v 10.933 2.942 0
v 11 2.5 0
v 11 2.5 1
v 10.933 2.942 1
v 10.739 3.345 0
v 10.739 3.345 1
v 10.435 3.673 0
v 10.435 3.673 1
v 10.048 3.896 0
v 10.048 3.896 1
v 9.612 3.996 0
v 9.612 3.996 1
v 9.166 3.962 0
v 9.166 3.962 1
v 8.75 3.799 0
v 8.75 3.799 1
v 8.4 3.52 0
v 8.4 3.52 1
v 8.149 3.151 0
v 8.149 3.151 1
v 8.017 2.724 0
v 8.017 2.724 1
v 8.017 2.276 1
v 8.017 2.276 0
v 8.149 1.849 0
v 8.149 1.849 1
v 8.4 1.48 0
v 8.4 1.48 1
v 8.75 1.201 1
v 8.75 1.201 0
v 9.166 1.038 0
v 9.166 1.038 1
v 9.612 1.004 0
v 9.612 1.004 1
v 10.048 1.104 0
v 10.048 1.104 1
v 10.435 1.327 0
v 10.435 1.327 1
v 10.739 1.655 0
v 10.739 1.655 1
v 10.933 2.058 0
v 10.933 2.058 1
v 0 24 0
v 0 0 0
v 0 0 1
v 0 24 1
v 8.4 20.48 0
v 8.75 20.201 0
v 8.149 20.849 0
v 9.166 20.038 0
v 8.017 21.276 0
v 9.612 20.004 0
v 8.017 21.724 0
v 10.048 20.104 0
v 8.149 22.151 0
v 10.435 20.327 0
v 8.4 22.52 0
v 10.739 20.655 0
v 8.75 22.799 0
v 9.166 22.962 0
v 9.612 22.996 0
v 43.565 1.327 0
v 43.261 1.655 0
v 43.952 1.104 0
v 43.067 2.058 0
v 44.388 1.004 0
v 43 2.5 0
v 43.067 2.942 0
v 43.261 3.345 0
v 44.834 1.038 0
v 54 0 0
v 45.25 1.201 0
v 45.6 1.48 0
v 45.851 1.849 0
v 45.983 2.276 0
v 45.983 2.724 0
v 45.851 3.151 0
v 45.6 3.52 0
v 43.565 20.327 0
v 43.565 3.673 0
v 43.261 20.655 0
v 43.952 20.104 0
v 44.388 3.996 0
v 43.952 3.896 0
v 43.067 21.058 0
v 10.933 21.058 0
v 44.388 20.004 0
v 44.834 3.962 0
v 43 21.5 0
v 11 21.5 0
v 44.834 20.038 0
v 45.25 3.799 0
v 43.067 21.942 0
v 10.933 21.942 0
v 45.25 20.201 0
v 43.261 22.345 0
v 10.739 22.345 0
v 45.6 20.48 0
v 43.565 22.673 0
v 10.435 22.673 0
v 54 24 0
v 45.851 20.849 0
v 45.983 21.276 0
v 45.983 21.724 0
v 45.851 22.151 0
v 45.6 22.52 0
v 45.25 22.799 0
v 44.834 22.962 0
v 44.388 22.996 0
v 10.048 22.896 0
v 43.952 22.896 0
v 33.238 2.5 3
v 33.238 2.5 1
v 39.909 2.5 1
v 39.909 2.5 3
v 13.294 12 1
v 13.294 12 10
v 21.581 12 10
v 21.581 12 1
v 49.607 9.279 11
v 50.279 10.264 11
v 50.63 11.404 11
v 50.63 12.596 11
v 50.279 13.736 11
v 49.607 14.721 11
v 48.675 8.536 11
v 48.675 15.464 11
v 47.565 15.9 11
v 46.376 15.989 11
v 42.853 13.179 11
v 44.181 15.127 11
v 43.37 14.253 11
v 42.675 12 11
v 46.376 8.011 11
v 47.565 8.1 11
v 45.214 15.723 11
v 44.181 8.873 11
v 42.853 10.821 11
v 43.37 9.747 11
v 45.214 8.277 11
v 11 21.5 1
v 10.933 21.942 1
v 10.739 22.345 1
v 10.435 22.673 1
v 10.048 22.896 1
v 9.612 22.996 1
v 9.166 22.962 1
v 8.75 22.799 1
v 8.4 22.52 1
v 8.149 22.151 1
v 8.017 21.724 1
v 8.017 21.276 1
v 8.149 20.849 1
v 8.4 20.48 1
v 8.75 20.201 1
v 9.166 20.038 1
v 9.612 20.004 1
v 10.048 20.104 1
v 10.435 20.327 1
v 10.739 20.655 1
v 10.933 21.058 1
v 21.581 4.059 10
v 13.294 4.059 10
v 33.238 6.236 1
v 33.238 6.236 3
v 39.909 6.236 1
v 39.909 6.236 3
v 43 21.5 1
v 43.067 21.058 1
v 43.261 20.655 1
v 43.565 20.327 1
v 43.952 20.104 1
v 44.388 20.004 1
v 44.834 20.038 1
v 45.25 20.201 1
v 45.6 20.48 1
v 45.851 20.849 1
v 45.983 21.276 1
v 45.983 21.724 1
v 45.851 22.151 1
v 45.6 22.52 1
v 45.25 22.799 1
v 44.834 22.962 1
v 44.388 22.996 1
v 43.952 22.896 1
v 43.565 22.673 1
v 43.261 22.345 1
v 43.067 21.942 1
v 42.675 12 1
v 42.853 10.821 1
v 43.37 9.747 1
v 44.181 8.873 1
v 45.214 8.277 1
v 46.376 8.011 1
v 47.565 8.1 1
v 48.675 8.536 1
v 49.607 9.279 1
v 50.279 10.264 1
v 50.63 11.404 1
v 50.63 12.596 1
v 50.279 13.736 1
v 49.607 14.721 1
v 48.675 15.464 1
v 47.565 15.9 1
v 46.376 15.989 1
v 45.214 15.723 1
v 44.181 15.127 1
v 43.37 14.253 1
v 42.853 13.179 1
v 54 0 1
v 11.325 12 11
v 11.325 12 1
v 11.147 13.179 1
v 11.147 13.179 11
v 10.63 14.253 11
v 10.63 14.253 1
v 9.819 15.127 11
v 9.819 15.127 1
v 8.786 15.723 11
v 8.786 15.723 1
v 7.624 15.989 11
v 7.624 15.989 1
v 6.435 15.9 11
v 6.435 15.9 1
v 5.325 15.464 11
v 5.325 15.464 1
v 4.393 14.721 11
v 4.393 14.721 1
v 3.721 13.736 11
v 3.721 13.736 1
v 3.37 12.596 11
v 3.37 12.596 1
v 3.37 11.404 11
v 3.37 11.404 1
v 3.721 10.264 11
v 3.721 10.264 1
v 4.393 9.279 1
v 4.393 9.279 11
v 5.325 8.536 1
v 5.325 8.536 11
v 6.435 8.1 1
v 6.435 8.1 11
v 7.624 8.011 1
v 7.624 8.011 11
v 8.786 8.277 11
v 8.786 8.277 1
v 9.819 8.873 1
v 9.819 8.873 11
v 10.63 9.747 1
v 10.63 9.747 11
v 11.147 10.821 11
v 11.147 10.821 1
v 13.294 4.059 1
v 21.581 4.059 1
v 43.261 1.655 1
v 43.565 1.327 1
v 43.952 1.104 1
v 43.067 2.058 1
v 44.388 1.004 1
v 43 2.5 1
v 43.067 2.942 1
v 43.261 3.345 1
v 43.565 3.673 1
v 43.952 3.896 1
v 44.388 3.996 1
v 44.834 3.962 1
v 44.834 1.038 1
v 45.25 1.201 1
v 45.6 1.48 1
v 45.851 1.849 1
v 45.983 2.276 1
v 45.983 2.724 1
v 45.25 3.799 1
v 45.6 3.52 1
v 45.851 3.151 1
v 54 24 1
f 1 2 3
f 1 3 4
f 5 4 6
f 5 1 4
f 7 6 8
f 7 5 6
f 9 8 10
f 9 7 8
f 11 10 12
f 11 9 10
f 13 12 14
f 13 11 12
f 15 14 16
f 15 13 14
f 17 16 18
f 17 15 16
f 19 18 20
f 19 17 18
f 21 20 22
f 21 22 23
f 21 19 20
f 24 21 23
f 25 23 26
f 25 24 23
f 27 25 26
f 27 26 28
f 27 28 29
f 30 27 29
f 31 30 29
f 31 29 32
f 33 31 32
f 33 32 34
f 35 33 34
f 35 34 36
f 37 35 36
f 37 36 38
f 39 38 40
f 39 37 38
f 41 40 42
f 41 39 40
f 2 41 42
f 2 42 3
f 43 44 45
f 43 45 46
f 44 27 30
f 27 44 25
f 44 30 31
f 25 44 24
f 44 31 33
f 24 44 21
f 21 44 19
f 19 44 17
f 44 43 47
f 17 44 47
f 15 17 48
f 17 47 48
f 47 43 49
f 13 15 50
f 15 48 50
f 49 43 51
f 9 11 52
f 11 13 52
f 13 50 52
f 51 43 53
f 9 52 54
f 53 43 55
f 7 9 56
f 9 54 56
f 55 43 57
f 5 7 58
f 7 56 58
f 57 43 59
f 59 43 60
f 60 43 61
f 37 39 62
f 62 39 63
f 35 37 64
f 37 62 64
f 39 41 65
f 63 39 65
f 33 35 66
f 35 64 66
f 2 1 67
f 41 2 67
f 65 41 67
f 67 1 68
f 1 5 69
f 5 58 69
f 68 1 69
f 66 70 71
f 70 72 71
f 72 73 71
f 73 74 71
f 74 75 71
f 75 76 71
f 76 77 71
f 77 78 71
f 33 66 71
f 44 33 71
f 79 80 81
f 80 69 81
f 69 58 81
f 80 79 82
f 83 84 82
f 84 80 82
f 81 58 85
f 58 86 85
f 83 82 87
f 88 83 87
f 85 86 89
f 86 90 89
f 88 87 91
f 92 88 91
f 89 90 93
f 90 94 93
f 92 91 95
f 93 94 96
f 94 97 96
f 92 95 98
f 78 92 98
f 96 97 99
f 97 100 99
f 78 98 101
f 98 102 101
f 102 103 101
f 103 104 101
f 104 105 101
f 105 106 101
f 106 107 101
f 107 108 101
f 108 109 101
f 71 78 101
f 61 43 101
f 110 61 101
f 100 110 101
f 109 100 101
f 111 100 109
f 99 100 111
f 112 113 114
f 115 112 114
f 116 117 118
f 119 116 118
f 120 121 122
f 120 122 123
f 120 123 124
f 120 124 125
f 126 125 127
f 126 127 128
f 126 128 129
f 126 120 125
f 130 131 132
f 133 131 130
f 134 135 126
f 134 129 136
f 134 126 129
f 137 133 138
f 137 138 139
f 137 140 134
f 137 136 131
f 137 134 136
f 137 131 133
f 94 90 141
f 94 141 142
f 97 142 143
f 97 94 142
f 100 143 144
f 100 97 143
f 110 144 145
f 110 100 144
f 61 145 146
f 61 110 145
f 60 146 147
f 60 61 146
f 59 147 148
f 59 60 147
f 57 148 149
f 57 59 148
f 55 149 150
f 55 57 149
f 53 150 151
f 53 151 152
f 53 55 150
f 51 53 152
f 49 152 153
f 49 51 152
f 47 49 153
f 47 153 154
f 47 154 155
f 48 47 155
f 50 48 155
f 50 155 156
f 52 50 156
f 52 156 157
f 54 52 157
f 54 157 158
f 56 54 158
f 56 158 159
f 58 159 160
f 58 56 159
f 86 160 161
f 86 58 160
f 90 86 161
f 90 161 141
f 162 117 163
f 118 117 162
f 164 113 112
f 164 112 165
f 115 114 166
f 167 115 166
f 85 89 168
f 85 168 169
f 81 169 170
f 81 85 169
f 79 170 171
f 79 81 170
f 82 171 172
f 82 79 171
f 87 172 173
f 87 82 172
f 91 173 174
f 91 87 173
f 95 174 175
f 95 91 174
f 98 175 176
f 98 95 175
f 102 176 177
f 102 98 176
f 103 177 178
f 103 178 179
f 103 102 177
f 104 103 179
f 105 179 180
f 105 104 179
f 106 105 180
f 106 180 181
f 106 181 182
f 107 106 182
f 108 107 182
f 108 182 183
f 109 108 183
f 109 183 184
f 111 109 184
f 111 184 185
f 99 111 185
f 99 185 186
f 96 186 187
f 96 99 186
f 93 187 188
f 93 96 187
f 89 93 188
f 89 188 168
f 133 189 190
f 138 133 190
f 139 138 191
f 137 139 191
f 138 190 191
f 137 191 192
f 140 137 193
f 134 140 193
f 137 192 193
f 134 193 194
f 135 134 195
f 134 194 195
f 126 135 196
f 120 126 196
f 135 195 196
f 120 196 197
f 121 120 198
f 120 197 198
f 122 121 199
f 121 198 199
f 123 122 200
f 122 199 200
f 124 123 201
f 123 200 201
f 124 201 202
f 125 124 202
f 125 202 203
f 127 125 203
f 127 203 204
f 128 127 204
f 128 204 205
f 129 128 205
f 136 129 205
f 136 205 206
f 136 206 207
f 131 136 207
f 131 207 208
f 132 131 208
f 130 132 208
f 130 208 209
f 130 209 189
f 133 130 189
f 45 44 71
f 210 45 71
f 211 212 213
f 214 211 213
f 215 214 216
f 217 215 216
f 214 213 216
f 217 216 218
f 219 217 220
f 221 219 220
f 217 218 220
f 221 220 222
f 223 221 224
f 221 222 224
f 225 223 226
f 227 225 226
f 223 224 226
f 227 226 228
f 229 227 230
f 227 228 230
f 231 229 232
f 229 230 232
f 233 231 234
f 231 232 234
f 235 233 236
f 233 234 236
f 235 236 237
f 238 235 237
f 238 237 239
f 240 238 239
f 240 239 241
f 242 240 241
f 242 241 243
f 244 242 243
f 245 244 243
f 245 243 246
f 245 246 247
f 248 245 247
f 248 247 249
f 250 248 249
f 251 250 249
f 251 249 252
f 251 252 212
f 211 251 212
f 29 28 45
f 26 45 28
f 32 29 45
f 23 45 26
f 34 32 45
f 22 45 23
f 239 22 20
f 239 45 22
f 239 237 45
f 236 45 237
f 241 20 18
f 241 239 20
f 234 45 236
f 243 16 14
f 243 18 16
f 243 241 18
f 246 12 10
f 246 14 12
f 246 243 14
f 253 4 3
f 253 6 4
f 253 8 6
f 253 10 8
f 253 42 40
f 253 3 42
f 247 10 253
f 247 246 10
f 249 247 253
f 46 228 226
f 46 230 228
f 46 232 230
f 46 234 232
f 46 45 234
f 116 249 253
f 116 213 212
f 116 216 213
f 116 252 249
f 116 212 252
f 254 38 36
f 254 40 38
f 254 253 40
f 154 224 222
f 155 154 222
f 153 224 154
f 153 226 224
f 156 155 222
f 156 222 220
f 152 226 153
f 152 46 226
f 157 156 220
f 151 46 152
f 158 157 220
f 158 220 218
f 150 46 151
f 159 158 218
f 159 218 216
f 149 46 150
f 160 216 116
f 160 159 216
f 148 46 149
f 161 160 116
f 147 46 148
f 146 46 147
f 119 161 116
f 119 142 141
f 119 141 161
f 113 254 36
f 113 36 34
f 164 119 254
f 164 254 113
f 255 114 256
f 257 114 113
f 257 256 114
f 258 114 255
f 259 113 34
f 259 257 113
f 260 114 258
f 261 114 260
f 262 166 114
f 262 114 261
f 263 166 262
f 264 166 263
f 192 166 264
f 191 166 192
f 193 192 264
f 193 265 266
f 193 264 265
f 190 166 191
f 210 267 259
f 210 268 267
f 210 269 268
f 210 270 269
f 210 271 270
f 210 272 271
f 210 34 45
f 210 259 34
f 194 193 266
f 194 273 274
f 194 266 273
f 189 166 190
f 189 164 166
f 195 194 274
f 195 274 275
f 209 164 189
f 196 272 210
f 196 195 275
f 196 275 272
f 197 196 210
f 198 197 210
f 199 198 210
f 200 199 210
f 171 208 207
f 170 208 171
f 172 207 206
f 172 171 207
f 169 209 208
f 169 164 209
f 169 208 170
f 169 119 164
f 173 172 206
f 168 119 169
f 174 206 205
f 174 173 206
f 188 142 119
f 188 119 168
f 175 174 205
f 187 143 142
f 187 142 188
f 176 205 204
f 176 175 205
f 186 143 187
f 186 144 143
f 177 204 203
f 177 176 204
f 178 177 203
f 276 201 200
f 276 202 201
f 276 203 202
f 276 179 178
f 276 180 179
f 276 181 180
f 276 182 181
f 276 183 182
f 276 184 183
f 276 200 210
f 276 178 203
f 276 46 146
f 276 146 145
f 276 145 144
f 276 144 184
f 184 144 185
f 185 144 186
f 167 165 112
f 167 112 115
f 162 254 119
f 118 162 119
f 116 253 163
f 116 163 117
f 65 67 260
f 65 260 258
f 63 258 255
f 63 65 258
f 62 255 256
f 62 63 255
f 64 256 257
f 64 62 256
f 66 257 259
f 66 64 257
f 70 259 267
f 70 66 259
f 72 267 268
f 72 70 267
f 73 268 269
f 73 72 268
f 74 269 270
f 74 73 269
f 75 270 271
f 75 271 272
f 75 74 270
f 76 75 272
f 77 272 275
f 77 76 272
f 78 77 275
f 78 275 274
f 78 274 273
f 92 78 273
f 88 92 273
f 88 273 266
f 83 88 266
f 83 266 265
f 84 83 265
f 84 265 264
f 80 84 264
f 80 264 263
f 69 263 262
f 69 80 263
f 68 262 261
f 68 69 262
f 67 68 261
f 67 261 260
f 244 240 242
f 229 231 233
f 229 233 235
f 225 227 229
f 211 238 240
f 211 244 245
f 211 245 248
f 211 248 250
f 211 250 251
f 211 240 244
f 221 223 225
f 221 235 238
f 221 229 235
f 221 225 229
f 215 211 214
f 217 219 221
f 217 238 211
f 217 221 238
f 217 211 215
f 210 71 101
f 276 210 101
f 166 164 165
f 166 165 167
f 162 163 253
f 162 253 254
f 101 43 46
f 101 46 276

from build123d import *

# Parameters (mm, degrees)
SKETCH1_W           = 54
SKETCH1_H           = 24
SKETCH1_R           = 1.5
SKETCH1_R_2         = 4
SKETCH1_W_2         = 6.671328762
SKETCH1_H_2         = 3.736160039
SKETCH1_W_3         = 8.286492568
SKETCH1_H_3         = 7.940799873
BOSS_EXTRUDE1_DEPTH = 1
SKETCH1_2_R         = 4
BOSS_EXTRUDE2_DEPTH = 11
SKETCH1_3_W         = 8.286492568
SKETCH1_3_H         = 7.940799873
BOSS_EXTRUDE3_DEPTH = 10
SKETCH1_4_W         = 6.671328762
SKETCH1_4_H         = 3.736160039
BOSS_EXTRUDE4_DEPTH = 3


with BuildPart() as part:
    # Sketch1 → Boss-Extrude1 (new body)
    with BuildSketch(Plane.XY):
        with Locations((27, 12)):
            Rectangle(SKETCH1_W, SKETCH1_H)
        with Locations((9.5, 21.5)):
            Circle(SKETCH1_R, mode=Mode.SUBTRACT)
        with Locations((9.5, 2.5)):
            Circle(SKETCH1_R, mode=Mode.SUBTRACT)
        with Locations((44.5, 2.5)):
            Circle(SKETCH1_R, mode=Mode.SUBTRACT)
        with Locations((44.5, 21.5)):
            Circle(SKETCH1_R, mode=Mode.SUBTRACT)
        with Locations((7.325006642, 12)):
            Circle(SKETCH1_R_2, mode=Mode.SUBTRACT)
        with Locations((46.674993358, 12)):
            Circle(SKETCH1_R_2, mode=Mode.SUBTRACT)
        with Locations((36.573516425, 4.36808002)):
            Rectangle(SKETCH1_W_2, SKETCH1_H_2, mode=Mode.SUBTRACT)
        with Locations((17.437336555, 8.029600064)):
            Rectangle(SKETCH1_W_3, SKETCH1_H_3, mode=Mode.SUBTRACT)
    extrude(amount=BOSS_EXTRUDE1_DEPTH)

    # Sketch1<2> → Boss-Extrude2 (add)
    with BuildSketch(Plane.XY):
        with Locations((7.325006642, 12)):
            Circle(SKETCH1_2_R)
        with Locations((46.674993358, 12)):
            Circle(SKETCH1_2_R)
    extrude(amount=BOSS_EXTRUDE2_DEPTH)

    # Sketch1<3> → Boss-Extrude3 (add)
    with BuildSketch(Plane.XY):
        with Locations((17.437336555, 8.029600064)):
            Rectangle(SKETCH1_3_W, SKETCH1_3_H)
    extrude(amount=BOSS_EXTRUDE3_DEPTH)

    # Sketch1<4> → Boss-Extrude4 (add)
    with BuildSketch(Plane.XY):
        with Locations((36.573516425, 4.36808002)):
            Rectangle(SKETCH1_4_W, SKETCH1_4_H)
    extrude(amount=BOSS_EXTRUDE4_DEPTH)


solid = part.part
